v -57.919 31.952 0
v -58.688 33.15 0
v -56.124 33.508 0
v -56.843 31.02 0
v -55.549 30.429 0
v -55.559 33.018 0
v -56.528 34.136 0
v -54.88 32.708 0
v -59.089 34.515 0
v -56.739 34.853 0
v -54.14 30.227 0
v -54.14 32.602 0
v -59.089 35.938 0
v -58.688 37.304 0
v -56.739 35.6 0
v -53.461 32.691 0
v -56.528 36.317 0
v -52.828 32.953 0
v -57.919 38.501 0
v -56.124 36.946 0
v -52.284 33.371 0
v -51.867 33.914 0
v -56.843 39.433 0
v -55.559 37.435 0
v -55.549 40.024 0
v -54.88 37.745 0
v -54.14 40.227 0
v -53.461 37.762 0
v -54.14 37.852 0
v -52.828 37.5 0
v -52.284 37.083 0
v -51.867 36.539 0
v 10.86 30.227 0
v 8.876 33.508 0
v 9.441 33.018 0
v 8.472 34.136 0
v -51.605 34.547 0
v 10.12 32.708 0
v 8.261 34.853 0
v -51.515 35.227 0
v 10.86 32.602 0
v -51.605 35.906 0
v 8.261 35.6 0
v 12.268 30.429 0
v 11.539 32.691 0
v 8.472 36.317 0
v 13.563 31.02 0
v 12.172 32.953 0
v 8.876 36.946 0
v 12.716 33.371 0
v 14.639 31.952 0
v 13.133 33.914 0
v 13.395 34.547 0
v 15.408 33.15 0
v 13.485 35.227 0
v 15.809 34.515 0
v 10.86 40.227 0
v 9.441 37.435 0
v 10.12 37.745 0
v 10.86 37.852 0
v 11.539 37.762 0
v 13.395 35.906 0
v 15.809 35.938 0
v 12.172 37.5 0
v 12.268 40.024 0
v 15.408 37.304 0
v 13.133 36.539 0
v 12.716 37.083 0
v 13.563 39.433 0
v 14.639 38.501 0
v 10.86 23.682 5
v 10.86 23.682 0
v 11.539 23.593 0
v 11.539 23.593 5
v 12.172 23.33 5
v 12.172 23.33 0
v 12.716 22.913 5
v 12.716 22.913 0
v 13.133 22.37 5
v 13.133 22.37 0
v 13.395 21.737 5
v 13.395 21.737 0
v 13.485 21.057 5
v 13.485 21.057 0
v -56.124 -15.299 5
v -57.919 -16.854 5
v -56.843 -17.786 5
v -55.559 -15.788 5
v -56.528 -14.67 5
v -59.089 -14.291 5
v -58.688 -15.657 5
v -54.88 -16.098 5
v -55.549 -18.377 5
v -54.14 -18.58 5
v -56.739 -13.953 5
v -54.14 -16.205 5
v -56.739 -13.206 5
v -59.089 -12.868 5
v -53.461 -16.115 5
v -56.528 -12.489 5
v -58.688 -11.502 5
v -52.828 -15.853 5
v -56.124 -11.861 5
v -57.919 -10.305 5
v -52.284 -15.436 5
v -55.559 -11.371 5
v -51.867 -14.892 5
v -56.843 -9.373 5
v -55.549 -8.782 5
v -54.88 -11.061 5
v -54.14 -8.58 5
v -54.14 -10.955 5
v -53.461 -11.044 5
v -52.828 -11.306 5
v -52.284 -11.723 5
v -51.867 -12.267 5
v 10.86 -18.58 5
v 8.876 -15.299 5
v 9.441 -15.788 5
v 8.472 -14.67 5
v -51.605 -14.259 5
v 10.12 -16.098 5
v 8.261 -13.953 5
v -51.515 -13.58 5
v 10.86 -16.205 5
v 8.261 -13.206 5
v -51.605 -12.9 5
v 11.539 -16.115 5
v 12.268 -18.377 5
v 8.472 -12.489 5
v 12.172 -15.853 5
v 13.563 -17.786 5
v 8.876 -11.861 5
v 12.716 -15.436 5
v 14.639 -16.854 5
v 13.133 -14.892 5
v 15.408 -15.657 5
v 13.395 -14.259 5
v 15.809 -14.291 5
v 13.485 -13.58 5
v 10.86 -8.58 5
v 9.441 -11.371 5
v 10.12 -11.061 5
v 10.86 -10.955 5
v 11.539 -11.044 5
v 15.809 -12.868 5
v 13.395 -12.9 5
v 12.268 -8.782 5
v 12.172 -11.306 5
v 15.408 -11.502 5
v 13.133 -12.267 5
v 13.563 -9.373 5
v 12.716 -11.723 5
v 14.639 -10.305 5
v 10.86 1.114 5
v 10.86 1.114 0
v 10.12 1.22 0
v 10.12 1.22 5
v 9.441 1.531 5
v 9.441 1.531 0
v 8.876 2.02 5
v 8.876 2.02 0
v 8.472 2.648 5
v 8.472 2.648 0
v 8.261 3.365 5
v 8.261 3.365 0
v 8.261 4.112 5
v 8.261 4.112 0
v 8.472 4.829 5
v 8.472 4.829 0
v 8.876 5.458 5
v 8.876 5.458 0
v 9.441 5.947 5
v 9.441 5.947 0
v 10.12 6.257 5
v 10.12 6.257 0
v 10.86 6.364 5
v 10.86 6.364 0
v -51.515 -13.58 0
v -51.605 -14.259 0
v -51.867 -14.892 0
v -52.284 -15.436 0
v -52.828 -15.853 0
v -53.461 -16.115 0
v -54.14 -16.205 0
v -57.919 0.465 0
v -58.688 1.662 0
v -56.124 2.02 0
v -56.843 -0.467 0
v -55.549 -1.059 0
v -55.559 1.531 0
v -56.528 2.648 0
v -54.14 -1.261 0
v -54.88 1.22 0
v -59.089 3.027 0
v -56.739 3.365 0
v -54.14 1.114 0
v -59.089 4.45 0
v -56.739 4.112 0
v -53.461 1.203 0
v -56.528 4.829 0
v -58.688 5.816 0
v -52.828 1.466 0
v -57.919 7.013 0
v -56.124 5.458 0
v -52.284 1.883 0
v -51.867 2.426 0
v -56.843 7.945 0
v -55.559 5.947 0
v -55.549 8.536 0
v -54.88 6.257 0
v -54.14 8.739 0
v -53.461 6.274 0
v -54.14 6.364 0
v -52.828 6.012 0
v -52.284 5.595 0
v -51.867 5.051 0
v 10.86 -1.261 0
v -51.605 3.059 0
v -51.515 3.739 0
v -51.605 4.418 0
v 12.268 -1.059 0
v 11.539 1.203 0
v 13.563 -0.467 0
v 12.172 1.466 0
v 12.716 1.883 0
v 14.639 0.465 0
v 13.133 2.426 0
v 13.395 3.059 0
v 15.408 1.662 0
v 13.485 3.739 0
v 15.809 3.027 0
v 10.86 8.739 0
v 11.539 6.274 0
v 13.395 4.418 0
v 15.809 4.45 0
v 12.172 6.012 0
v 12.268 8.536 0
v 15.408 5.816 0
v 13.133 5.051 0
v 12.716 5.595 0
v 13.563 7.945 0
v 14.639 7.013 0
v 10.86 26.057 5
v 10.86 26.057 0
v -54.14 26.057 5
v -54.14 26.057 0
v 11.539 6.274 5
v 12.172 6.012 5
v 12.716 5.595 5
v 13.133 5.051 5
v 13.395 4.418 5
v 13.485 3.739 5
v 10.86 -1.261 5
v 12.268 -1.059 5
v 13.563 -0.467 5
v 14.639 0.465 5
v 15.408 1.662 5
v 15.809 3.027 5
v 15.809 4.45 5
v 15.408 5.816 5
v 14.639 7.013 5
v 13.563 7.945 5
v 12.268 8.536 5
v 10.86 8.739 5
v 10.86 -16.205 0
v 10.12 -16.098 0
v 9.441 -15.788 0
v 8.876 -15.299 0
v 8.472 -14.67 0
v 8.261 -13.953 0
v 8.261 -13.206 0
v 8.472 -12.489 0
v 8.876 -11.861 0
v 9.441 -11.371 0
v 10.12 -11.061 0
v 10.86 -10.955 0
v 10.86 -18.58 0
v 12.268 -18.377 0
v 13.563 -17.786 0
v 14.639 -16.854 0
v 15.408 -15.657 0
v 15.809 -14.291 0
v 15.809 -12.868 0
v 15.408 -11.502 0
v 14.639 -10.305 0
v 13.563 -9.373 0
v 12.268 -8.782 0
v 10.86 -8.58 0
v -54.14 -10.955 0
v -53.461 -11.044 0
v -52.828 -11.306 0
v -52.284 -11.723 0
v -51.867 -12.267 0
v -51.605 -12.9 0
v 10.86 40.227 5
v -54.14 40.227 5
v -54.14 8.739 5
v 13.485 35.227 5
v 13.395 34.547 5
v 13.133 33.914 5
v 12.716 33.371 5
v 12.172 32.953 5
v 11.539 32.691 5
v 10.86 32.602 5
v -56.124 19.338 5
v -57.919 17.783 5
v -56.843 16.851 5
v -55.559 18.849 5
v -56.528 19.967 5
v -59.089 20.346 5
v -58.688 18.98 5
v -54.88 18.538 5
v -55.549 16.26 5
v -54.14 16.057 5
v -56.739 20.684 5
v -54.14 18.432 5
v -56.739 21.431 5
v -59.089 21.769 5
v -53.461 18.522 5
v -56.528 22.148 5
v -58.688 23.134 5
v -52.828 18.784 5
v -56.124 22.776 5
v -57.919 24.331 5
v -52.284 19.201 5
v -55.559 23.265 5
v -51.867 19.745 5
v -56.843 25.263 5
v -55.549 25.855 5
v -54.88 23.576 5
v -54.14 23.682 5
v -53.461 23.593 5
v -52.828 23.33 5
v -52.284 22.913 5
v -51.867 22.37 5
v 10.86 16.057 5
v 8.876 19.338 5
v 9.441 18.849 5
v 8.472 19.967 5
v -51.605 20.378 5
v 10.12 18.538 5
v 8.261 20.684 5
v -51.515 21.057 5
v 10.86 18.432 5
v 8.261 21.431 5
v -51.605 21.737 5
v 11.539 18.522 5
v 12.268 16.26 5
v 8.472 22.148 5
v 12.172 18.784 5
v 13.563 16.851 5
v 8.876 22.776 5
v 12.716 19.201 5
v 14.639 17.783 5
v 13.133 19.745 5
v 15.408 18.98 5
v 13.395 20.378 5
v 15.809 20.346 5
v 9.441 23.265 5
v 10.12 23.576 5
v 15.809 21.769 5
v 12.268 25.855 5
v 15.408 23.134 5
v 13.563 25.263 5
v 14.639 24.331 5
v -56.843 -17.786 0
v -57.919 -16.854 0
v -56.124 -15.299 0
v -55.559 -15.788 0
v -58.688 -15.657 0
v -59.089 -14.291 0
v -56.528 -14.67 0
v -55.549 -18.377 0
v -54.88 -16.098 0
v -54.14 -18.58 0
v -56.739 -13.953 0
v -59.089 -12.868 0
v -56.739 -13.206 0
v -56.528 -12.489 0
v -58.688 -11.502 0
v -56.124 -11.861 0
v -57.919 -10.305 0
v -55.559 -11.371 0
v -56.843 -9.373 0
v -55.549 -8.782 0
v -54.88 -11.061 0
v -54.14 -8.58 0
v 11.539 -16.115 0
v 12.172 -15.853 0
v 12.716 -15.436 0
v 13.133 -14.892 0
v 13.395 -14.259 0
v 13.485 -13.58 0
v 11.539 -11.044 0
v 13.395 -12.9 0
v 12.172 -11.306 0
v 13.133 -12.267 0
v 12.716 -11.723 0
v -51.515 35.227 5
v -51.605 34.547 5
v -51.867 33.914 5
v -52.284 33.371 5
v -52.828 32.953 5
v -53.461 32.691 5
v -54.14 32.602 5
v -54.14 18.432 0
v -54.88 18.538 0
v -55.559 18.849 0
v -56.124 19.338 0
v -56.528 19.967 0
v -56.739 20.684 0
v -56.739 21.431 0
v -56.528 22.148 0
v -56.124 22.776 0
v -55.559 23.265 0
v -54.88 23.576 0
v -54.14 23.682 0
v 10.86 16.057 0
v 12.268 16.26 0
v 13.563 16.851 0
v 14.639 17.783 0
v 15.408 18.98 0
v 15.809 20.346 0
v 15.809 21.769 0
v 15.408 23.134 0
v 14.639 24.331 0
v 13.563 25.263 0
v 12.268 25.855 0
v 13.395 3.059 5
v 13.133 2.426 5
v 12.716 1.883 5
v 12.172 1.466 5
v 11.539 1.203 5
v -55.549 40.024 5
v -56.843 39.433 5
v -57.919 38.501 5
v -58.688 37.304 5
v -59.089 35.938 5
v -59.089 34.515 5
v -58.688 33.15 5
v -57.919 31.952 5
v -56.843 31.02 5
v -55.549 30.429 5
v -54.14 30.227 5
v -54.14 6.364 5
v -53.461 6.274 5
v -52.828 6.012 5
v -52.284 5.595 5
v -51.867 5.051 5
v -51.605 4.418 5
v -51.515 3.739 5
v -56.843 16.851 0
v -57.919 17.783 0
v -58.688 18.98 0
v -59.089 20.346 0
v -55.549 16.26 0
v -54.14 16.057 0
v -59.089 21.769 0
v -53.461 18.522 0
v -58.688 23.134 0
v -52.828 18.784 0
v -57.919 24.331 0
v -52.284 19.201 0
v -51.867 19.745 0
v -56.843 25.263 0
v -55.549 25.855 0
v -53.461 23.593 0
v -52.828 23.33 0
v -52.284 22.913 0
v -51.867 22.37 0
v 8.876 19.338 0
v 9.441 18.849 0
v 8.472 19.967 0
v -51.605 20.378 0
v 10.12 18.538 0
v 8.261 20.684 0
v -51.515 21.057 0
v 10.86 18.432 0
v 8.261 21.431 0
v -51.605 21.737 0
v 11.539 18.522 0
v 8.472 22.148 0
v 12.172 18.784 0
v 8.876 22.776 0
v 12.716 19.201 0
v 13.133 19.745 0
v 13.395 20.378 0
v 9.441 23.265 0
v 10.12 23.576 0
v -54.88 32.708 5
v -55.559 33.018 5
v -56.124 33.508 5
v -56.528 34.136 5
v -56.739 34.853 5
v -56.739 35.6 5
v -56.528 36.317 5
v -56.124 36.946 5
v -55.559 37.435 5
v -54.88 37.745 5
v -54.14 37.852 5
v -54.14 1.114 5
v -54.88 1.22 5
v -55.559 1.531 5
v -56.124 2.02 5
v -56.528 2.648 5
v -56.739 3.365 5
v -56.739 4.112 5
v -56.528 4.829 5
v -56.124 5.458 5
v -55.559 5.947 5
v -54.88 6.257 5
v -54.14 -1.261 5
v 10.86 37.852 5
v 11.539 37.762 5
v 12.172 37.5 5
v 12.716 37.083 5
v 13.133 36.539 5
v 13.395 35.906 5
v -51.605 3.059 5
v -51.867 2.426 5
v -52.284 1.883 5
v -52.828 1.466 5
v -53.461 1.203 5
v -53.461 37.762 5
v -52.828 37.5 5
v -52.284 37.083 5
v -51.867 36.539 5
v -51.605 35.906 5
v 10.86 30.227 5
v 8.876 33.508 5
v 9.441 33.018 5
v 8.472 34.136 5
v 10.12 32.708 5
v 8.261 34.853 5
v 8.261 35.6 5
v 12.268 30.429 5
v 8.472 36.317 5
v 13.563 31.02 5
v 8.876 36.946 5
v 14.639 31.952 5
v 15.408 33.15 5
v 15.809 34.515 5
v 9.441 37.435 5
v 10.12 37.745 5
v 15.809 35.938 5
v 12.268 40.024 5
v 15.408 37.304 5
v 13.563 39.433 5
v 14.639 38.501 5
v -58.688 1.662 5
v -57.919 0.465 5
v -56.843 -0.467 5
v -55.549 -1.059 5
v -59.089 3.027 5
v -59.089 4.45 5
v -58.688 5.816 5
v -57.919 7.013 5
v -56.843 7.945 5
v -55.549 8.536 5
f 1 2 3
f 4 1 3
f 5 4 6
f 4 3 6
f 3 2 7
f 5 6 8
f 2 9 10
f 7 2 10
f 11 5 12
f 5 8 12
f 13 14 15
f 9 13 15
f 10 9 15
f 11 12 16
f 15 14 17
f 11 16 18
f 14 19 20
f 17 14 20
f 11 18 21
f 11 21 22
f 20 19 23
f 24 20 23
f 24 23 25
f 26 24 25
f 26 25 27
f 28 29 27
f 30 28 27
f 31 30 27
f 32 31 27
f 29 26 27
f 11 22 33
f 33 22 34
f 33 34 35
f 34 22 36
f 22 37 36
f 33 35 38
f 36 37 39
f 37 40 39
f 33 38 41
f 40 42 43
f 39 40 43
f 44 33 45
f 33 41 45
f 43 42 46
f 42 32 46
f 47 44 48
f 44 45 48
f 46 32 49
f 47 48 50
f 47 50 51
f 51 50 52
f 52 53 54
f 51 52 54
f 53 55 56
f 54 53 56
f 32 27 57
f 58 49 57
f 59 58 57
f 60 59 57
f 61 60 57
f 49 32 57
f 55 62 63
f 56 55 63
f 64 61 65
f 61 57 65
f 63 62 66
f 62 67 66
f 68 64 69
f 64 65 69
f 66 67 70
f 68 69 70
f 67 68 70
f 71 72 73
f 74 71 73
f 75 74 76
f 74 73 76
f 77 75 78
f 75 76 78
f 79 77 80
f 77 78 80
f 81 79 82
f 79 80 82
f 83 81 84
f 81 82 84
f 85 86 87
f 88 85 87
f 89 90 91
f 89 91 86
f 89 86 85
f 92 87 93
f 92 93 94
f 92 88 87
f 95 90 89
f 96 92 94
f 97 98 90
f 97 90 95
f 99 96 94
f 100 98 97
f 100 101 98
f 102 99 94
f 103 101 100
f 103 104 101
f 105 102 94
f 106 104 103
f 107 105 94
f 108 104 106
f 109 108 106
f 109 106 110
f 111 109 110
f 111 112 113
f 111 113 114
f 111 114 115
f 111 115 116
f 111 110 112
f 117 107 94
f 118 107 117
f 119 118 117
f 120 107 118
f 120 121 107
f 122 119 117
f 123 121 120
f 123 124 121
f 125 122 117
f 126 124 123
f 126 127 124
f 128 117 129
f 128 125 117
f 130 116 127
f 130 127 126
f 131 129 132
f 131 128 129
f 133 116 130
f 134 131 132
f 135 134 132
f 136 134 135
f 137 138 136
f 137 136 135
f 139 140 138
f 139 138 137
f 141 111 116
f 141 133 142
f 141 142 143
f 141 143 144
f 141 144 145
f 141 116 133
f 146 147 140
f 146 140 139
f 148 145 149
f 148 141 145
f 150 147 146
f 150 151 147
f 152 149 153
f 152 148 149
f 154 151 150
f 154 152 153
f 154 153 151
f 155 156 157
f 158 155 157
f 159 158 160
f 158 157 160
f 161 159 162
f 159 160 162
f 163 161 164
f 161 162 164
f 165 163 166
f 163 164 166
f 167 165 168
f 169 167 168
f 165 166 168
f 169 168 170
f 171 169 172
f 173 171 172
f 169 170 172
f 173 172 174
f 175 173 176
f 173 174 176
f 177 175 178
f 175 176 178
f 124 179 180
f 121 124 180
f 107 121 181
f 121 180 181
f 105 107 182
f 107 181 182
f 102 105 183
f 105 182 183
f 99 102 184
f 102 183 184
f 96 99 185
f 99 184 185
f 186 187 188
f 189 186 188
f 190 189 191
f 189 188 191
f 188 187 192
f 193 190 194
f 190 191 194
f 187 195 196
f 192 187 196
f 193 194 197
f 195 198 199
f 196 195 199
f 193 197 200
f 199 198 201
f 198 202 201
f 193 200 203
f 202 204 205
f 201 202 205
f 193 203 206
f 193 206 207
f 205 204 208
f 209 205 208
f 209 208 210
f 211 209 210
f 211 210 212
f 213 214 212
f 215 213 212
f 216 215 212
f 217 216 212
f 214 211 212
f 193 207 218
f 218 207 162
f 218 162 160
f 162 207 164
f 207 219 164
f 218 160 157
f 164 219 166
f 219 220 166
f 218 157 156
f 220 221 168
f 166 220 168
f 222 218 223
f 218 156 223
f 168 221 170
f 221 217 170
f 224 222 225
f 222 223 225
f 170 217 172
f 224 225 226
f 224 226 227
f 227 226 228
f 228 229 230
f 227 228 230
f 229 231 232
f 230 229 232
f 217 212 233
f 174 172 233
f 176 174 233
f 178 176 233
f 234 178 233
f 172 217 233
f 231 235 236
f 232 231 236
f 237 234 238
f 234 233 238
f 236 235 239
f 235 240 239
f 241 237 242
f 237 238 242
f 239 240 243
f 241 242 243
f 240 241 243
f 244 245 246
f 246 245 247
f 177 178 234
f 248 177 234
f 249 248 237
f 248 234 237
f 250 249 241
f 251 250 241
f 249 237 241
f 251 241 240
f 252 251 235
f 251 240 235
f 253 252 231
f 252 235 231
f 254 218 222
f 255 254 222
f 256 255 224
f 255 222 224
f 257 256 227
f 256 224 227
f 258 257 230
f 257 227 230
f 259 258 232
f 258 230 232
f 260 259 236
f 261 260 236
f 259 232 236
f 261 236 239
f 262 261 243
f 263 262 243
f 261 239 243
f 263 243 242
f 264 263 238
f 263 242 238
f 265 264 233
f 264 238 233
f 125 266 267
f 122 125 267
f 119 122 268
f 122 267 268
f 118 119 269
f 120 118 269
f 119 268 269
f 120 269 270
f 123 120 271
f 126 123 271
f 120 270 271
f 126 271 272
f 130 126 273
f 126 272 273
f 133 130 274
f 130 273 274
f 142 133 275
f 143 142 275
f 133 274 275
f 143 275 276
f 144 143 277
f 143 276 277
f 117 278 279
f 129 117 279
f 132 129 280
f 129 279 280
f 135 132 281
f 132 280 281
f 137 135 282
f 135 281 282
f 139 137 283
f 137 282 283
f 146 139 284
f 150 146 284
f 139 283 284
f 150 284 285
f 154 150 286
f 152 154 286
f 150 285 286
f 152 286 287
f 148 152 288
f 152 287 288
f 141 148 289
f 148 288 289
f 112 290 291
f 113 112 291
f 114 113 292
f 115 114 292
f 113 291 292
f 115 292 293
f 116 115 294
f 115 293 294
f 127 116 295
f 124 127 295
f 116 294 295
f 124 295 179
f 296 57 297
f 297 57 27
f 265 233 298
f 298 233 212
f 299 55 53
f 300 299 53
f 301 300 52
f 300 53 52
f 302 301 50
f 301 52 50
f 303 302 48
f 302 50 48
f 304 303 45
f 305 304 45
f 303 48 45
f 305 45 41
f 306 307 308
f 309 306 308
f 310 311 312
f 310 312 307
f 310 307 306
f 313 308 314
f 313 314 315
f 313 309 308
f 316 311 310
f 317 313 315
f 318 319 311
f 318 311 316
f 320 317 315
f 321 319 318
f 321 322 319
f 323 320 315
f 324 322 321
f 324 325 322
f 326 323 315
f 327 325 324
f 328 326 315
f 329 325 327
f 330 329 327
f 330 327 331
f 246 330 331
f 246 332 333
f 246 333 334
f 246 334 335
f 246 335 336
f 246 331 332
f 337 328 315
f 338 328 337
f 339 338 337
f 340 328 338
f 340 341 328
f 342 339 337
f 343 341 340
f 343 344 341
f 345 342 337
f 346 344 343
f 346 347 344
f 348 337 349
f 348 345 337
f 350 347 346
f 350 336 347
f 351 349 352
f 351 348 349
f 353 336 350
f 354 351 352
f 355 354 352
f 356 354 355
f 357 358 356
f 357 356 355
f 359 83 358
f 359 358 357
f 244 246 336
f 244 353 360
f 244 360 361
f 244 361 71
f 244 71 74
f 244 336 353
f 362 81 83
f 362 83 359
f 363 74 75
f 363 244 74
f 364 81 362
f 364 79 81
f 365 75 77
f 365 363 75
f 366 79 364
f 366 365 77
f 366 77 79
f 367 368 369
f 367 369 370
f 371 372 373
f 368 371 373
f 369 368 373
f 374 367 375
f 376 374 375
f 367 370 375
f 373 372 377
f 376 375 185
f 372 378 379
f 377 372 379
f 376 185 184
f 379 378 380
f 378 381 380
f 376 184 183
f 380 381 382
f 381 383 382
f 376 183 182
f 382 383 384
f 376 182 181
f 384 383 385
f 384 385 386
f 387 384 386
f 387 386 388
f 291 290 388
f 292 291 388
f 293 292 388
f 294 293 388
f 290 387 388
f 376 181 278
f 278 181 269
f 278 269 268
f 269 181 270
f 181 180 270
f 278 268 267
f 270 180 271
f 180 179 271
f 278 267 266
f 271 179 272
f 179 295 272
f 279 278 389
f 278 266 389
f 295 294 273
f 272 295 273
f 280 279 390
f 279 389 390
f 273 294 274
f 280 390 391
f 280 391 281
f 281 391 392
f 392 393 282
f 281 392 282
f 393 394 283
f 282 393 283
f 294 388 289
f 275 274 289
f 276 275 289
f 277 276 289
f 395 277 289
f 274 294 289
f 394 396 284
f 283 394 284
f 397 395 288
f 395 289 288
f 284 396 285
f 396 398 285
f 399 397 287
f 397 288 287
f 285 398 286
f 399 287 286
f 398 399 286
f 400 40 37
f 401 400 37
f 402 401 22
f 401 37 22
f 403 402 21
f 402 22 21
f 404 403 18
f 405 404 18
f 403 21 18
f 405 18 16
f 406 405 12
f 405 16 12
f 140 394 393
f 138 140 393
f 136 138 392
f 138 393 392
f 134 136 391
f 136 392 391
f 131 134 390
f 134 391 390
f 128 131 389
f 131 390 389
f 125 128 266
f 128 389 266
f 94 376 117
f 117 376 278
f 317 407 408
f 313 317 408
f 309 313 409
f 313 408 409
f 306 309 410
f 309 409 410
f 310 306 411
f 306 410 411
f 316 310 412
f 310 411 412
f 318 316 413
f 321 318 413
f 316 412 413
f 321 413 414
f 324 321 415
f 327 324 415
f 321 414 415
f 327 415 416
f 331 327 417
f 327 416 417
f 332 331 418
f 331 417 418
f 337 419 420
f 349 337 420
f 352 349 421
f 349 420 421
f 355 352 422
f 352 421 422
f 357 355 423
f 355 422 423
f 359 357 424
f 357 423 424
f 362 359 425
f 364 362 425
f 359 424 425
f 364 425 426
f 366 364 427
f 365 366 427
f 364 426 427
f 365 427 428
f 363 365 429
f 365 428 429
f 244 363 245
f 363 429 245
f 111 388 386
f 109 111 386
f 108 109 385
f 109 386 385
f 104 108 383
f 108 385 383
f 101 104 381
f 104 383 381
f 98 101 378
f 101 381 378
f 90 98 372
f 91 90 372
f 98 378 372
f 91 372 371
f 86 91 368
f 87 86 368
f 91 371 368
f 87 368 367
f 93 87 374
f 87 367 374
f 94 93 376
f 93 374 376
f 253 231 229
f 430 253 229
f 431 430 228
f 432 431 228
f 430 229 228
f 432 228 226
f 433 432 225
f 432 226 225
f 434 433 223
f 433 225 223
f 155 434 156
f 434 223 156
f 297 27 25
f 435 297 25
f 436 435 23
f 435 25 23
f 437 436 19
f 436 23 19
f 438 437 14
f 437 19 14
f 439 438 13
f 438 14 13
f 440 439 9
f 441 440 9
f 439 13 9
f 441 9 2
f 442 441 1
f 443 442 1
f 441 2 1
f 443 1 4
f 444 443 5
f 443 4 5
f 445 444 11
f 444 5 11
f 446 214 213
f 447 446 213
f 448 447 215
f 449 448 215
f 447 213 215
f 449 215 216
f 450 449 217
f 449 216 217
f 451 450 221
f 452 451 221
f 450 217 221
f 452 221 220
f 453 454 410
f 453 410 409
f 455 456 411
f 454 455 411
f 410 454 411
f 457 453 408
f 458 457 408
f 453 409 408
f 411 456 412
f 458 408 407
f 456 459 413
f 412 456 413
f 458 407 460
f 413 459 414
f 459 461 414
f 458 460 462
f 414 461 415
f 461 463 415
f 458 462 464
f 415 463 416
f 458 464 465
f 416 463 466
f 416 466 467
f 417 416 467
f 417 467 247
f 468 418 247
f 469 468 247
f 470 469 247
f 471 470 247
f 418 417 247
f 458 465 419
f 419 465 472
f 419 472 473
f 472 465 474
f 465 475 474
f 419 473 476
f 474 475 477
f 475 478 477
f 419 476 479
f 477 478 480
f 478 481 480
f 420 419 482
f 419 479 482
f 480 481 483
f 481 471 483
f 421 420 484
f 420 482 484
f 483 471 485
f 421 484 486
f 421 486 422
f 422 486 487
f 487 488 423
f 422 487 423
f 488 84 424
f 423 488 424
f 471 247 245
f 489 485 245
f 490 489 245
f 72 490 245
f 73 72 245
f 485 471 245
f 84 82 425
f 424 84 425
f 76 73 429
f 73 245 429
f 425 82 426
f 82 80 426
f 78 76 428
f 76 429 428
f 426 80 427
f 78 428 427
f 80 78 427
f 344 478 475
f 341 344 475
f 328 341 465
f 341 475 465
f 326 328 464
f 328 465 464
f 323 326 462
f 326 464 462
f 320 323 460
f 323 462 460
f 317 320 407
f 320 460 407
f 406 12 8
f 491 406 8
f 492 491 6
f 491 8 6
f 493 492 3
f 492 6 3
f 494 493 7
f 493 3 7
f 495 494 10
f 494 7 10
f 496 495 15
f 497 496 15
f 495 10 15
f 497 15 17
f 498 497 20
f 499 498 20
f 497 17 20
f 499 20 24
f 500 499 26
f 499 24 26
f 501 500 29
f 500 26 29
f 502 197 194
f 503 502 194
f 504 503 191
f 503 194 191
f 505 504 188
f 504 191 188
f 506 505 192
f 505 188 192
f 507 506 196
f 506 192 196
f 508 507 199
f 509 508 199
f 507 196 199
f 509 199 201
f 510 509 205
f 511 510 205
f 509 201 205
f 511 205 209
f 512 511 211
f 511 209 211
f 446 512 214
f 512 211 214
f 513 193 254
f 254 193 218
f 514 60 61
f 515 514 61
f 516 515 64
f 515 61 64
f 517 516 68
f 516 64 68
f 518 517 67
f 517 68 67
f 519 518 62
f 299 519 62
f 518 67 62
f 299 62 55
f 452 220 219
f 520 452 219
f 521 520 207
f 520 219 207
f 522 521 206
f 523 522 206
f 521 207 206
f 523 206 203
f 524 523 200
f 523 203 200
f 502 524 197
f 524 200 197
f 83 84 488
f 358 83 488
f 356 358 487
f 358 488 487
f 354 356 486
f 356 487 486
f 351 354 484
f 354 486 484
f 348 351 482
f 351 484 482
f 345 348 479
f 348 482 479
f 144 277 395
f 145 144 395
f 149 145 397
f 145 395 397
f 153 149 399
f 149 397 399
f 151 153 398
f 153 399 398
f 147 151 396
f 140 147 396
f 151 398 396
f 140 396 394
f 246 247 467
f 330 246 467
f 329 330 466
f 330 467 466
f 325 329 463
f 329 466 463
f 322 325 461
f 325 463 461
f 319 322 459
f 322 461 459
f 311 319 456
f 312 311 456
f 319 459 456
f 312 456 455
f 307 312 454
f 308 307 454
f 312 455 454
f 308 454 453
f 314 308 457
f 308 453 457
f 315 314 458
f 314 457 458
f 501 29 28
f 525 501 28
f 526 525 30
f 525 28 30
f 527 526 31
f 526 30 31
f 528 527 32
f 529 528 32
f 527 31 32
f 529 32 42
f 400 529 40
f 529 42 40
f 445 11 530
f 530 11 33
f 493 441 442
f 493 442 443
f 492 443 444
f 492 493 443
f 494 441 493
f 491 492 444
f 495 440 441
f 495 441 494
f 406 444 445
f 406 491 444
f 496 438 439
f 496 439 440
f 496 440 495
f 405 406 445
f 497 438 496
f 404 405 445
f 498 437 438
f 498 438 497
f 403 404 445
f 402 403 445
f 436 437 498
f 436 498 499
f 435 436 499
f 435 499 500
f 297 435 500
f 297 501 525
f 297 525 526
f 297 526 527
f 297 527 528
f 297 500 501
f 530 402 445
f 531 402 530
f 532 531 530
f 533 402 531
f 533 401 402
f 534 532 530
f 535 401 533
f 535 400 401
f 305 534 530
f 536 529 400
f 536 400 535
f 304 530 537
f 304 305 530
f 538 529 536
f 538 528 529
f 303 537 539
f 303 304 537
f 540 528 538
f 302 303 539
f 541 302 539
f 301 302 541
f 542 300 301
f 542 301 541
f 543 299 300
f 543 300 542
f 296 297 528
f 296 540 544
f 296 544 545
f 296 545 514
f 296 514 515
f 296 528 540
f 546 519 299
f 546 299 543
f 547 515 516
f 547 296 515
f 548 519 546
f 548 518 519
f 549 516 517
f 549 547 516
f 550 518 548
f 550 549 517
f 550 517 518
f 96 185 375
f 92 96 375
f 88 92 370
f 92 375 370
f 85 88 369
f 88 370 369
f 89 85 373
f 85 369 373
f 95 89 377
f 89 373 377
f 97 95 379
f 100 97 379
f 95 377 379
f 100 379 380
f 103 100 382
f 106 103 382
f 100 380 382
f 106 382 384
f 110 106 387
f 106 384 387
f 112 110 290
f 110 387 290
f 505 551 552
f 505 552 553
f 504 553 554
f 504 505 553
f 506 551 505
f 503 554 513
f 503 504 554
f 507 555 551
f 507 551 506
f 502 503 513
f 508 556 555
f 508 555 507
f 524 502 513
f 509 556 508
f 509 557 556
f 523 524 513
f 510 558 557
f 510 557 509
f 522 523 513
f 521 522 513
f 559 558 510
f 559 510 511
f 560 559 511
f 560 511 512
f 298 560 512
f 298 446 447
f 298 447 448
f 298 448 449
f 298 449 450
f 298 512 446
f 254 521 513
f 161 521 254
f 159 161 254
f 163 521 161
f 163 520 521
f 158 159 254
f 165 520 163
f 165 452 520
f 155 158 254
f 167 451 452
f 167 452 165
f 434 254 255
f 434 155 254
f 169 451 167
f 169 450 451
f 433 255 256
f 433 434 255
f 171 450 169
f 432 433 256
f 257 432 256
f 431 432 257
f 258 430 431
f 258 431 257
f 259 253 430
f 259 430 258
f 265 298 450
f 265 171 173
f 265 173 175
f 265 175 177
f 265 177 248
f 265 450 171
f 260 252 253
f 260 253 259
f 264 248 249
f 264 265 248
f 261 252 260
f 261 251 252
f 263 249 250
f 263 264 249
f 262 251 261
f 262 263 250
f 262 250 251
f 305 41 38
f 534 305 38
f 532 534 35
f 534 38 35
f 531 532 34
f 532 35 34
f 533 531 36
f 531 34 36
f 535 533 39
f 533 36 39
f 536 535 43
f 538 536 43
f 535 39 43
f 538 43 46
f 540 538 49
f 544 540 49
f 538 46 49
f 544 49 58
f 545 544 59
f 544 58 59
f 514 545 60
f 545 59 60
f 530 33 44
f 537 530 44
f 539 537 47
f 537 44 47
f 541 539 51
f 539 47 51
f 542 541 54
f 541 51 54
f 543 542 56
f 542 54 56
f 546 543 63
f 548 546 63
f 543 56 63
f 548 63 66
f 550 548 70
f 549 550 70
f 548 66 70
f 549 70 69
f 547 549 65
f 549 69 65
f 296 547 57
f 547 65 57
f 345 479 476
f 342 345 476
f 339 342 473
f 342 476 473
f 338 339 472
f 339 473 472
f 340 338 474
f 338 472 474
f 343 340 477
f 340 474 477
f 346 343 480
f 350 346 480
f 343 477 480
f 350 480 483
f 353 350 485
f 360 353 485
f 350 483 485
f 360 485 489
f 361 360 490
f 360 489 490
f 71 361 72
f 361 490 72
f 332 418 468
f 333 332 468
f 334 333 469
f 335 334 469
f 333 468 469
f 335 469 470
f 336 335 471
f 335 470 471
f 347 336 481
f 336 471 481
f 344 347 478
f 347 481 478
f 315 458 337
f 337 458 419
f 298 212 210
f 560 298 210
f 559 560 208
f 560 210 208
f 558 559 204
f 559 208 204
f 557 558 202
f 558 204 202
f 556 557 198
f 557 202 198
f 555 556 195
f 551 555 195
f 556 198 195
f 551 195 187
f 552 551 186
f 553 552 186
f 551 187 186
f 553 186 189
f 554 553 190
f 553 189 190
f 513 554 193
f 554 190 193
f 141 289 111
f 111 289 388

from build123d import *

# Parameters (mm, degrees)
F1_DEPTH = 5


with BuildPart() as f1:
    # F0 (on Top) → F1 (new body)
    with BuildSketch(Plane.XY):
        with BuildLine():
            Line((10.859756, 40.226706), (-54.140244, 40.226706))
            Line((-54.140244, 40.226706), (-54.140244, 37.851706))
            ThreePointArc((-54.140244, 37.851706), (-52.284089, 37.082861), (-51.515244, 35.226706))
            ThreePointArc((-51.515244, 35.226706), (-52.284089, 33.370551), (-54.140244, 32.601706))
            Line((-54.140244, 32.601706), (-54.140244, 30.226706))
            Line((-54.140244, 30.226706), (10.859756, 30.226706))
            Line((10.859756, 30.226706), (10.859756, 32.601706))
            ThreePointArc((10.859756, 32.601706), (8.234756, 35.226706), (10.859756, 37.851706))
            Line((10.859756, 37.851706), (10.859756, 40.226706))
        make_face()
        with BuildLine():
            Line((-54.140244, 37.851706), (-54.140244, 40.226706))
            ThreePointArc((-54.140244, 40.226706), (-59.140244, 35.226706), (-54.140244, 30.226706))
            Line((-54.140244, 30.226706), (-54.140244, 32.601706))
            ThreePointArc((-54.140244, 32.601706), (-56.765244, 35.226706), (-54.140244, 37.851706))
        make_face()
        with BuildLine():
            ThreePointArc((10.859756, 30.226706), (15.859756, 35.226706), (10.859756, 40.226706))
            Line((10.859756, 40.226706), (10.859756, 37.851706))
            ThreePointArc((10.859756, 37.851706), (12.715911, 37.082861), (13.484756, 35.226706))
            ThreePointArc((13.484756, 35.226706), (12.715911, 33.370551), (10.859756, 32.601706))
            Line((10.859756, 32.601706), (10.859756, 30.226706))
        make_face()
        with BuildLine():
            Line((10.859756, 26.057158), (-54.140244, 26.057158))
            Line((-54.140244, 26.057158), (-54.140244, 23.682158))
            ThreePointArc((-54.140244, 23.682158), (-52.284089, 22.913313), (-51.515244, 21.057158))
            ThreePointArc((-51.515244, 21.057158), (-52.284089, 19.201002), (-54.140244, 18.432158))
            Line((-54.140244, 18.432158), (-54.140244, 16.057158))
            Line((-54.140244, 16.057158), (10.859756, 16.057158))
            Line((10.859756, 16.057158), (10.859756, 18.432158))
            ThreePointArc((10.859756, 18.432158), (8.234756, 21.057158), (10.859756, 23.682158))
            Line((10.859756, 23.682158), (10.859756, 26.057158))
        make_face()
        with BuildLine():
            Line((-54.140244, 23.682158), (-54.140244, 26.057158))
            ThreePointArc((-54.140244, 26.057158), (-59.140244, 21.057158), (-54.140244, 16.057158))
            Line((-54.140244, 16.057158), (-54.140244, 18.432158))
            ThreePointArc((-54.140244, 18.432158), (-56.765244, 21.057158), (-54.140244, 23.682158))
        make_face()
        with BuildLine():
            ThreePointArc((10.859756, 16.057158), (15.859756, 21.057158), (10.859756, 26.057158))
            Line((10.859756, 26.057158), (10.859756, 23.682158))
            ThreePointArc((10.859756, 23.682158), (12.715911, 22.913313), (13.484756, 21.057158))
            ThreePointArc((13.484756, 21.057158), (12.715911, 19.201002), (10.859756, 18.432158))
            Line((10.859756, 18.432158), (10.859756, 16.057158))
        make_face()
        with BuildLine():
            Line((10.859756, 8.738818), (-54.140244, 8.738818))
            Line((-54.140244, 8.738818), (-54.140244, 6.363818))
            ThreePointArc((-54.140244, 6.363818), (-52.284089, 5.594973), (-51.515244, 3.738818))
            ThreePointArc((-51.515244, 3.738818), (-52.284089, 1.882663), (-54.140244, 1.113818))
            Line((-54.140244, 1.113818), (-54.140244, -1.261182))
            Line((-54.140244, -1.261182), (10.859756, -1.261182))
            Line((10.859756, -1.261182), (10.859756, 1.113818))
            ThreePointArc((10.859756, 1.113818), (8.234756, 3.738818), (10.859756, 6.363818))
            Line((10.859756, 6.363818), (10.859756, 8.738818))
        make_face()
        with BuildLine():
            Line((-54.140244, 6.363818), (-54.140244, 8.738818))
            ThreePointArc((-54.140244, 8.738818), (-59.140244, 3.738818), (-54.140244, -1.261182))
            Line((-54.140244, -1.261182), (-54.140244, 1.113818))
            ThreePointArc((-54.140244, 1.113818), (-56.765244, 3.738818), (-54.140244, 6.363818))
        make_face()
        with BuildLine():
            ThreePointArc((10.859756, -1.261182), (15.859756, 3.738818), (10.859756, 8.738818))
            Line((10.859756, 8.738818), (10.859756, 6.363818))
            ThreePointArc((10.859756, 6.363818), (12.715911, 5.594973), (13.484756, 3.738818))
            ThreePointArc((13.484756, 3.738818), (12.715911, 1.882663), (10.859756, 1.113818))
            Line((10.859756, 1.113818), (10.859756, -1.261182))
        make_face()
        with BuildLine():
            Line((10.859756, -8.57952), (-54.140244, -8.57952))
            Line((-54.140244, -8.57952), (-54.140244, -10.95452))
            ThreePointArc((-54.140244, -10.95452), (-52.284089, -11.723365), (-51.515244, -13.57952))
            ThreePointArc((-51.515244, -13.57952), (-52.284089, -15.435676), (-54.140244, -16.20452))
            Line((-54.140244, -16.20452), (-54.140244, -18.57952))
            Line((-54.140244, -18.57952), (10.859756, -18.57952))
            Line((10.859756, -18.57952), (10.859756, -16.20452))
            ThreePointArc((10.859756, -16.20452), (8.234756, -13.57952), (10.859756, -10.95452))
            Line((10.859756, -10.95452), (10.859756, -8.57952))
        make_face()
        with BuildLine():
            Line((-54.140244, -10.95452), (-54.140244, -8.57952))
            ThreePointArc((-54.140244, -8.57952), (-59.140244, -13.57952), (-54.140244, -18.57952))
            Line((-54.140244, -18.57952), (-54.140244, -16.20452))
            ThreePointArc((-54.140244, -16.20452), (-56.765244, -13.57952), (-54.140244, -10.95452))
        make_face()
        with BuildLine():
            ThreePointArc((10.859756, -18.57952), (15.859756, -13.57952), (10.859756, -8.57952))
            Line((10.859756, -8.57952), (10.859756, -10.95452))
            ThreePointArc((10.859756, -10.95452), (12.715911, -11.723365), (13.484756, -13.57952))
            ThreePointArc((13.484756, -13.57952), (12.715911, -15.435676), (10.859756, -16.20452))
            Line((10.859756, -16.20452), (10.859756, -18.57952))
        make_face()
    extrude(amount=F1_DEPTH)


solid = f1.part
